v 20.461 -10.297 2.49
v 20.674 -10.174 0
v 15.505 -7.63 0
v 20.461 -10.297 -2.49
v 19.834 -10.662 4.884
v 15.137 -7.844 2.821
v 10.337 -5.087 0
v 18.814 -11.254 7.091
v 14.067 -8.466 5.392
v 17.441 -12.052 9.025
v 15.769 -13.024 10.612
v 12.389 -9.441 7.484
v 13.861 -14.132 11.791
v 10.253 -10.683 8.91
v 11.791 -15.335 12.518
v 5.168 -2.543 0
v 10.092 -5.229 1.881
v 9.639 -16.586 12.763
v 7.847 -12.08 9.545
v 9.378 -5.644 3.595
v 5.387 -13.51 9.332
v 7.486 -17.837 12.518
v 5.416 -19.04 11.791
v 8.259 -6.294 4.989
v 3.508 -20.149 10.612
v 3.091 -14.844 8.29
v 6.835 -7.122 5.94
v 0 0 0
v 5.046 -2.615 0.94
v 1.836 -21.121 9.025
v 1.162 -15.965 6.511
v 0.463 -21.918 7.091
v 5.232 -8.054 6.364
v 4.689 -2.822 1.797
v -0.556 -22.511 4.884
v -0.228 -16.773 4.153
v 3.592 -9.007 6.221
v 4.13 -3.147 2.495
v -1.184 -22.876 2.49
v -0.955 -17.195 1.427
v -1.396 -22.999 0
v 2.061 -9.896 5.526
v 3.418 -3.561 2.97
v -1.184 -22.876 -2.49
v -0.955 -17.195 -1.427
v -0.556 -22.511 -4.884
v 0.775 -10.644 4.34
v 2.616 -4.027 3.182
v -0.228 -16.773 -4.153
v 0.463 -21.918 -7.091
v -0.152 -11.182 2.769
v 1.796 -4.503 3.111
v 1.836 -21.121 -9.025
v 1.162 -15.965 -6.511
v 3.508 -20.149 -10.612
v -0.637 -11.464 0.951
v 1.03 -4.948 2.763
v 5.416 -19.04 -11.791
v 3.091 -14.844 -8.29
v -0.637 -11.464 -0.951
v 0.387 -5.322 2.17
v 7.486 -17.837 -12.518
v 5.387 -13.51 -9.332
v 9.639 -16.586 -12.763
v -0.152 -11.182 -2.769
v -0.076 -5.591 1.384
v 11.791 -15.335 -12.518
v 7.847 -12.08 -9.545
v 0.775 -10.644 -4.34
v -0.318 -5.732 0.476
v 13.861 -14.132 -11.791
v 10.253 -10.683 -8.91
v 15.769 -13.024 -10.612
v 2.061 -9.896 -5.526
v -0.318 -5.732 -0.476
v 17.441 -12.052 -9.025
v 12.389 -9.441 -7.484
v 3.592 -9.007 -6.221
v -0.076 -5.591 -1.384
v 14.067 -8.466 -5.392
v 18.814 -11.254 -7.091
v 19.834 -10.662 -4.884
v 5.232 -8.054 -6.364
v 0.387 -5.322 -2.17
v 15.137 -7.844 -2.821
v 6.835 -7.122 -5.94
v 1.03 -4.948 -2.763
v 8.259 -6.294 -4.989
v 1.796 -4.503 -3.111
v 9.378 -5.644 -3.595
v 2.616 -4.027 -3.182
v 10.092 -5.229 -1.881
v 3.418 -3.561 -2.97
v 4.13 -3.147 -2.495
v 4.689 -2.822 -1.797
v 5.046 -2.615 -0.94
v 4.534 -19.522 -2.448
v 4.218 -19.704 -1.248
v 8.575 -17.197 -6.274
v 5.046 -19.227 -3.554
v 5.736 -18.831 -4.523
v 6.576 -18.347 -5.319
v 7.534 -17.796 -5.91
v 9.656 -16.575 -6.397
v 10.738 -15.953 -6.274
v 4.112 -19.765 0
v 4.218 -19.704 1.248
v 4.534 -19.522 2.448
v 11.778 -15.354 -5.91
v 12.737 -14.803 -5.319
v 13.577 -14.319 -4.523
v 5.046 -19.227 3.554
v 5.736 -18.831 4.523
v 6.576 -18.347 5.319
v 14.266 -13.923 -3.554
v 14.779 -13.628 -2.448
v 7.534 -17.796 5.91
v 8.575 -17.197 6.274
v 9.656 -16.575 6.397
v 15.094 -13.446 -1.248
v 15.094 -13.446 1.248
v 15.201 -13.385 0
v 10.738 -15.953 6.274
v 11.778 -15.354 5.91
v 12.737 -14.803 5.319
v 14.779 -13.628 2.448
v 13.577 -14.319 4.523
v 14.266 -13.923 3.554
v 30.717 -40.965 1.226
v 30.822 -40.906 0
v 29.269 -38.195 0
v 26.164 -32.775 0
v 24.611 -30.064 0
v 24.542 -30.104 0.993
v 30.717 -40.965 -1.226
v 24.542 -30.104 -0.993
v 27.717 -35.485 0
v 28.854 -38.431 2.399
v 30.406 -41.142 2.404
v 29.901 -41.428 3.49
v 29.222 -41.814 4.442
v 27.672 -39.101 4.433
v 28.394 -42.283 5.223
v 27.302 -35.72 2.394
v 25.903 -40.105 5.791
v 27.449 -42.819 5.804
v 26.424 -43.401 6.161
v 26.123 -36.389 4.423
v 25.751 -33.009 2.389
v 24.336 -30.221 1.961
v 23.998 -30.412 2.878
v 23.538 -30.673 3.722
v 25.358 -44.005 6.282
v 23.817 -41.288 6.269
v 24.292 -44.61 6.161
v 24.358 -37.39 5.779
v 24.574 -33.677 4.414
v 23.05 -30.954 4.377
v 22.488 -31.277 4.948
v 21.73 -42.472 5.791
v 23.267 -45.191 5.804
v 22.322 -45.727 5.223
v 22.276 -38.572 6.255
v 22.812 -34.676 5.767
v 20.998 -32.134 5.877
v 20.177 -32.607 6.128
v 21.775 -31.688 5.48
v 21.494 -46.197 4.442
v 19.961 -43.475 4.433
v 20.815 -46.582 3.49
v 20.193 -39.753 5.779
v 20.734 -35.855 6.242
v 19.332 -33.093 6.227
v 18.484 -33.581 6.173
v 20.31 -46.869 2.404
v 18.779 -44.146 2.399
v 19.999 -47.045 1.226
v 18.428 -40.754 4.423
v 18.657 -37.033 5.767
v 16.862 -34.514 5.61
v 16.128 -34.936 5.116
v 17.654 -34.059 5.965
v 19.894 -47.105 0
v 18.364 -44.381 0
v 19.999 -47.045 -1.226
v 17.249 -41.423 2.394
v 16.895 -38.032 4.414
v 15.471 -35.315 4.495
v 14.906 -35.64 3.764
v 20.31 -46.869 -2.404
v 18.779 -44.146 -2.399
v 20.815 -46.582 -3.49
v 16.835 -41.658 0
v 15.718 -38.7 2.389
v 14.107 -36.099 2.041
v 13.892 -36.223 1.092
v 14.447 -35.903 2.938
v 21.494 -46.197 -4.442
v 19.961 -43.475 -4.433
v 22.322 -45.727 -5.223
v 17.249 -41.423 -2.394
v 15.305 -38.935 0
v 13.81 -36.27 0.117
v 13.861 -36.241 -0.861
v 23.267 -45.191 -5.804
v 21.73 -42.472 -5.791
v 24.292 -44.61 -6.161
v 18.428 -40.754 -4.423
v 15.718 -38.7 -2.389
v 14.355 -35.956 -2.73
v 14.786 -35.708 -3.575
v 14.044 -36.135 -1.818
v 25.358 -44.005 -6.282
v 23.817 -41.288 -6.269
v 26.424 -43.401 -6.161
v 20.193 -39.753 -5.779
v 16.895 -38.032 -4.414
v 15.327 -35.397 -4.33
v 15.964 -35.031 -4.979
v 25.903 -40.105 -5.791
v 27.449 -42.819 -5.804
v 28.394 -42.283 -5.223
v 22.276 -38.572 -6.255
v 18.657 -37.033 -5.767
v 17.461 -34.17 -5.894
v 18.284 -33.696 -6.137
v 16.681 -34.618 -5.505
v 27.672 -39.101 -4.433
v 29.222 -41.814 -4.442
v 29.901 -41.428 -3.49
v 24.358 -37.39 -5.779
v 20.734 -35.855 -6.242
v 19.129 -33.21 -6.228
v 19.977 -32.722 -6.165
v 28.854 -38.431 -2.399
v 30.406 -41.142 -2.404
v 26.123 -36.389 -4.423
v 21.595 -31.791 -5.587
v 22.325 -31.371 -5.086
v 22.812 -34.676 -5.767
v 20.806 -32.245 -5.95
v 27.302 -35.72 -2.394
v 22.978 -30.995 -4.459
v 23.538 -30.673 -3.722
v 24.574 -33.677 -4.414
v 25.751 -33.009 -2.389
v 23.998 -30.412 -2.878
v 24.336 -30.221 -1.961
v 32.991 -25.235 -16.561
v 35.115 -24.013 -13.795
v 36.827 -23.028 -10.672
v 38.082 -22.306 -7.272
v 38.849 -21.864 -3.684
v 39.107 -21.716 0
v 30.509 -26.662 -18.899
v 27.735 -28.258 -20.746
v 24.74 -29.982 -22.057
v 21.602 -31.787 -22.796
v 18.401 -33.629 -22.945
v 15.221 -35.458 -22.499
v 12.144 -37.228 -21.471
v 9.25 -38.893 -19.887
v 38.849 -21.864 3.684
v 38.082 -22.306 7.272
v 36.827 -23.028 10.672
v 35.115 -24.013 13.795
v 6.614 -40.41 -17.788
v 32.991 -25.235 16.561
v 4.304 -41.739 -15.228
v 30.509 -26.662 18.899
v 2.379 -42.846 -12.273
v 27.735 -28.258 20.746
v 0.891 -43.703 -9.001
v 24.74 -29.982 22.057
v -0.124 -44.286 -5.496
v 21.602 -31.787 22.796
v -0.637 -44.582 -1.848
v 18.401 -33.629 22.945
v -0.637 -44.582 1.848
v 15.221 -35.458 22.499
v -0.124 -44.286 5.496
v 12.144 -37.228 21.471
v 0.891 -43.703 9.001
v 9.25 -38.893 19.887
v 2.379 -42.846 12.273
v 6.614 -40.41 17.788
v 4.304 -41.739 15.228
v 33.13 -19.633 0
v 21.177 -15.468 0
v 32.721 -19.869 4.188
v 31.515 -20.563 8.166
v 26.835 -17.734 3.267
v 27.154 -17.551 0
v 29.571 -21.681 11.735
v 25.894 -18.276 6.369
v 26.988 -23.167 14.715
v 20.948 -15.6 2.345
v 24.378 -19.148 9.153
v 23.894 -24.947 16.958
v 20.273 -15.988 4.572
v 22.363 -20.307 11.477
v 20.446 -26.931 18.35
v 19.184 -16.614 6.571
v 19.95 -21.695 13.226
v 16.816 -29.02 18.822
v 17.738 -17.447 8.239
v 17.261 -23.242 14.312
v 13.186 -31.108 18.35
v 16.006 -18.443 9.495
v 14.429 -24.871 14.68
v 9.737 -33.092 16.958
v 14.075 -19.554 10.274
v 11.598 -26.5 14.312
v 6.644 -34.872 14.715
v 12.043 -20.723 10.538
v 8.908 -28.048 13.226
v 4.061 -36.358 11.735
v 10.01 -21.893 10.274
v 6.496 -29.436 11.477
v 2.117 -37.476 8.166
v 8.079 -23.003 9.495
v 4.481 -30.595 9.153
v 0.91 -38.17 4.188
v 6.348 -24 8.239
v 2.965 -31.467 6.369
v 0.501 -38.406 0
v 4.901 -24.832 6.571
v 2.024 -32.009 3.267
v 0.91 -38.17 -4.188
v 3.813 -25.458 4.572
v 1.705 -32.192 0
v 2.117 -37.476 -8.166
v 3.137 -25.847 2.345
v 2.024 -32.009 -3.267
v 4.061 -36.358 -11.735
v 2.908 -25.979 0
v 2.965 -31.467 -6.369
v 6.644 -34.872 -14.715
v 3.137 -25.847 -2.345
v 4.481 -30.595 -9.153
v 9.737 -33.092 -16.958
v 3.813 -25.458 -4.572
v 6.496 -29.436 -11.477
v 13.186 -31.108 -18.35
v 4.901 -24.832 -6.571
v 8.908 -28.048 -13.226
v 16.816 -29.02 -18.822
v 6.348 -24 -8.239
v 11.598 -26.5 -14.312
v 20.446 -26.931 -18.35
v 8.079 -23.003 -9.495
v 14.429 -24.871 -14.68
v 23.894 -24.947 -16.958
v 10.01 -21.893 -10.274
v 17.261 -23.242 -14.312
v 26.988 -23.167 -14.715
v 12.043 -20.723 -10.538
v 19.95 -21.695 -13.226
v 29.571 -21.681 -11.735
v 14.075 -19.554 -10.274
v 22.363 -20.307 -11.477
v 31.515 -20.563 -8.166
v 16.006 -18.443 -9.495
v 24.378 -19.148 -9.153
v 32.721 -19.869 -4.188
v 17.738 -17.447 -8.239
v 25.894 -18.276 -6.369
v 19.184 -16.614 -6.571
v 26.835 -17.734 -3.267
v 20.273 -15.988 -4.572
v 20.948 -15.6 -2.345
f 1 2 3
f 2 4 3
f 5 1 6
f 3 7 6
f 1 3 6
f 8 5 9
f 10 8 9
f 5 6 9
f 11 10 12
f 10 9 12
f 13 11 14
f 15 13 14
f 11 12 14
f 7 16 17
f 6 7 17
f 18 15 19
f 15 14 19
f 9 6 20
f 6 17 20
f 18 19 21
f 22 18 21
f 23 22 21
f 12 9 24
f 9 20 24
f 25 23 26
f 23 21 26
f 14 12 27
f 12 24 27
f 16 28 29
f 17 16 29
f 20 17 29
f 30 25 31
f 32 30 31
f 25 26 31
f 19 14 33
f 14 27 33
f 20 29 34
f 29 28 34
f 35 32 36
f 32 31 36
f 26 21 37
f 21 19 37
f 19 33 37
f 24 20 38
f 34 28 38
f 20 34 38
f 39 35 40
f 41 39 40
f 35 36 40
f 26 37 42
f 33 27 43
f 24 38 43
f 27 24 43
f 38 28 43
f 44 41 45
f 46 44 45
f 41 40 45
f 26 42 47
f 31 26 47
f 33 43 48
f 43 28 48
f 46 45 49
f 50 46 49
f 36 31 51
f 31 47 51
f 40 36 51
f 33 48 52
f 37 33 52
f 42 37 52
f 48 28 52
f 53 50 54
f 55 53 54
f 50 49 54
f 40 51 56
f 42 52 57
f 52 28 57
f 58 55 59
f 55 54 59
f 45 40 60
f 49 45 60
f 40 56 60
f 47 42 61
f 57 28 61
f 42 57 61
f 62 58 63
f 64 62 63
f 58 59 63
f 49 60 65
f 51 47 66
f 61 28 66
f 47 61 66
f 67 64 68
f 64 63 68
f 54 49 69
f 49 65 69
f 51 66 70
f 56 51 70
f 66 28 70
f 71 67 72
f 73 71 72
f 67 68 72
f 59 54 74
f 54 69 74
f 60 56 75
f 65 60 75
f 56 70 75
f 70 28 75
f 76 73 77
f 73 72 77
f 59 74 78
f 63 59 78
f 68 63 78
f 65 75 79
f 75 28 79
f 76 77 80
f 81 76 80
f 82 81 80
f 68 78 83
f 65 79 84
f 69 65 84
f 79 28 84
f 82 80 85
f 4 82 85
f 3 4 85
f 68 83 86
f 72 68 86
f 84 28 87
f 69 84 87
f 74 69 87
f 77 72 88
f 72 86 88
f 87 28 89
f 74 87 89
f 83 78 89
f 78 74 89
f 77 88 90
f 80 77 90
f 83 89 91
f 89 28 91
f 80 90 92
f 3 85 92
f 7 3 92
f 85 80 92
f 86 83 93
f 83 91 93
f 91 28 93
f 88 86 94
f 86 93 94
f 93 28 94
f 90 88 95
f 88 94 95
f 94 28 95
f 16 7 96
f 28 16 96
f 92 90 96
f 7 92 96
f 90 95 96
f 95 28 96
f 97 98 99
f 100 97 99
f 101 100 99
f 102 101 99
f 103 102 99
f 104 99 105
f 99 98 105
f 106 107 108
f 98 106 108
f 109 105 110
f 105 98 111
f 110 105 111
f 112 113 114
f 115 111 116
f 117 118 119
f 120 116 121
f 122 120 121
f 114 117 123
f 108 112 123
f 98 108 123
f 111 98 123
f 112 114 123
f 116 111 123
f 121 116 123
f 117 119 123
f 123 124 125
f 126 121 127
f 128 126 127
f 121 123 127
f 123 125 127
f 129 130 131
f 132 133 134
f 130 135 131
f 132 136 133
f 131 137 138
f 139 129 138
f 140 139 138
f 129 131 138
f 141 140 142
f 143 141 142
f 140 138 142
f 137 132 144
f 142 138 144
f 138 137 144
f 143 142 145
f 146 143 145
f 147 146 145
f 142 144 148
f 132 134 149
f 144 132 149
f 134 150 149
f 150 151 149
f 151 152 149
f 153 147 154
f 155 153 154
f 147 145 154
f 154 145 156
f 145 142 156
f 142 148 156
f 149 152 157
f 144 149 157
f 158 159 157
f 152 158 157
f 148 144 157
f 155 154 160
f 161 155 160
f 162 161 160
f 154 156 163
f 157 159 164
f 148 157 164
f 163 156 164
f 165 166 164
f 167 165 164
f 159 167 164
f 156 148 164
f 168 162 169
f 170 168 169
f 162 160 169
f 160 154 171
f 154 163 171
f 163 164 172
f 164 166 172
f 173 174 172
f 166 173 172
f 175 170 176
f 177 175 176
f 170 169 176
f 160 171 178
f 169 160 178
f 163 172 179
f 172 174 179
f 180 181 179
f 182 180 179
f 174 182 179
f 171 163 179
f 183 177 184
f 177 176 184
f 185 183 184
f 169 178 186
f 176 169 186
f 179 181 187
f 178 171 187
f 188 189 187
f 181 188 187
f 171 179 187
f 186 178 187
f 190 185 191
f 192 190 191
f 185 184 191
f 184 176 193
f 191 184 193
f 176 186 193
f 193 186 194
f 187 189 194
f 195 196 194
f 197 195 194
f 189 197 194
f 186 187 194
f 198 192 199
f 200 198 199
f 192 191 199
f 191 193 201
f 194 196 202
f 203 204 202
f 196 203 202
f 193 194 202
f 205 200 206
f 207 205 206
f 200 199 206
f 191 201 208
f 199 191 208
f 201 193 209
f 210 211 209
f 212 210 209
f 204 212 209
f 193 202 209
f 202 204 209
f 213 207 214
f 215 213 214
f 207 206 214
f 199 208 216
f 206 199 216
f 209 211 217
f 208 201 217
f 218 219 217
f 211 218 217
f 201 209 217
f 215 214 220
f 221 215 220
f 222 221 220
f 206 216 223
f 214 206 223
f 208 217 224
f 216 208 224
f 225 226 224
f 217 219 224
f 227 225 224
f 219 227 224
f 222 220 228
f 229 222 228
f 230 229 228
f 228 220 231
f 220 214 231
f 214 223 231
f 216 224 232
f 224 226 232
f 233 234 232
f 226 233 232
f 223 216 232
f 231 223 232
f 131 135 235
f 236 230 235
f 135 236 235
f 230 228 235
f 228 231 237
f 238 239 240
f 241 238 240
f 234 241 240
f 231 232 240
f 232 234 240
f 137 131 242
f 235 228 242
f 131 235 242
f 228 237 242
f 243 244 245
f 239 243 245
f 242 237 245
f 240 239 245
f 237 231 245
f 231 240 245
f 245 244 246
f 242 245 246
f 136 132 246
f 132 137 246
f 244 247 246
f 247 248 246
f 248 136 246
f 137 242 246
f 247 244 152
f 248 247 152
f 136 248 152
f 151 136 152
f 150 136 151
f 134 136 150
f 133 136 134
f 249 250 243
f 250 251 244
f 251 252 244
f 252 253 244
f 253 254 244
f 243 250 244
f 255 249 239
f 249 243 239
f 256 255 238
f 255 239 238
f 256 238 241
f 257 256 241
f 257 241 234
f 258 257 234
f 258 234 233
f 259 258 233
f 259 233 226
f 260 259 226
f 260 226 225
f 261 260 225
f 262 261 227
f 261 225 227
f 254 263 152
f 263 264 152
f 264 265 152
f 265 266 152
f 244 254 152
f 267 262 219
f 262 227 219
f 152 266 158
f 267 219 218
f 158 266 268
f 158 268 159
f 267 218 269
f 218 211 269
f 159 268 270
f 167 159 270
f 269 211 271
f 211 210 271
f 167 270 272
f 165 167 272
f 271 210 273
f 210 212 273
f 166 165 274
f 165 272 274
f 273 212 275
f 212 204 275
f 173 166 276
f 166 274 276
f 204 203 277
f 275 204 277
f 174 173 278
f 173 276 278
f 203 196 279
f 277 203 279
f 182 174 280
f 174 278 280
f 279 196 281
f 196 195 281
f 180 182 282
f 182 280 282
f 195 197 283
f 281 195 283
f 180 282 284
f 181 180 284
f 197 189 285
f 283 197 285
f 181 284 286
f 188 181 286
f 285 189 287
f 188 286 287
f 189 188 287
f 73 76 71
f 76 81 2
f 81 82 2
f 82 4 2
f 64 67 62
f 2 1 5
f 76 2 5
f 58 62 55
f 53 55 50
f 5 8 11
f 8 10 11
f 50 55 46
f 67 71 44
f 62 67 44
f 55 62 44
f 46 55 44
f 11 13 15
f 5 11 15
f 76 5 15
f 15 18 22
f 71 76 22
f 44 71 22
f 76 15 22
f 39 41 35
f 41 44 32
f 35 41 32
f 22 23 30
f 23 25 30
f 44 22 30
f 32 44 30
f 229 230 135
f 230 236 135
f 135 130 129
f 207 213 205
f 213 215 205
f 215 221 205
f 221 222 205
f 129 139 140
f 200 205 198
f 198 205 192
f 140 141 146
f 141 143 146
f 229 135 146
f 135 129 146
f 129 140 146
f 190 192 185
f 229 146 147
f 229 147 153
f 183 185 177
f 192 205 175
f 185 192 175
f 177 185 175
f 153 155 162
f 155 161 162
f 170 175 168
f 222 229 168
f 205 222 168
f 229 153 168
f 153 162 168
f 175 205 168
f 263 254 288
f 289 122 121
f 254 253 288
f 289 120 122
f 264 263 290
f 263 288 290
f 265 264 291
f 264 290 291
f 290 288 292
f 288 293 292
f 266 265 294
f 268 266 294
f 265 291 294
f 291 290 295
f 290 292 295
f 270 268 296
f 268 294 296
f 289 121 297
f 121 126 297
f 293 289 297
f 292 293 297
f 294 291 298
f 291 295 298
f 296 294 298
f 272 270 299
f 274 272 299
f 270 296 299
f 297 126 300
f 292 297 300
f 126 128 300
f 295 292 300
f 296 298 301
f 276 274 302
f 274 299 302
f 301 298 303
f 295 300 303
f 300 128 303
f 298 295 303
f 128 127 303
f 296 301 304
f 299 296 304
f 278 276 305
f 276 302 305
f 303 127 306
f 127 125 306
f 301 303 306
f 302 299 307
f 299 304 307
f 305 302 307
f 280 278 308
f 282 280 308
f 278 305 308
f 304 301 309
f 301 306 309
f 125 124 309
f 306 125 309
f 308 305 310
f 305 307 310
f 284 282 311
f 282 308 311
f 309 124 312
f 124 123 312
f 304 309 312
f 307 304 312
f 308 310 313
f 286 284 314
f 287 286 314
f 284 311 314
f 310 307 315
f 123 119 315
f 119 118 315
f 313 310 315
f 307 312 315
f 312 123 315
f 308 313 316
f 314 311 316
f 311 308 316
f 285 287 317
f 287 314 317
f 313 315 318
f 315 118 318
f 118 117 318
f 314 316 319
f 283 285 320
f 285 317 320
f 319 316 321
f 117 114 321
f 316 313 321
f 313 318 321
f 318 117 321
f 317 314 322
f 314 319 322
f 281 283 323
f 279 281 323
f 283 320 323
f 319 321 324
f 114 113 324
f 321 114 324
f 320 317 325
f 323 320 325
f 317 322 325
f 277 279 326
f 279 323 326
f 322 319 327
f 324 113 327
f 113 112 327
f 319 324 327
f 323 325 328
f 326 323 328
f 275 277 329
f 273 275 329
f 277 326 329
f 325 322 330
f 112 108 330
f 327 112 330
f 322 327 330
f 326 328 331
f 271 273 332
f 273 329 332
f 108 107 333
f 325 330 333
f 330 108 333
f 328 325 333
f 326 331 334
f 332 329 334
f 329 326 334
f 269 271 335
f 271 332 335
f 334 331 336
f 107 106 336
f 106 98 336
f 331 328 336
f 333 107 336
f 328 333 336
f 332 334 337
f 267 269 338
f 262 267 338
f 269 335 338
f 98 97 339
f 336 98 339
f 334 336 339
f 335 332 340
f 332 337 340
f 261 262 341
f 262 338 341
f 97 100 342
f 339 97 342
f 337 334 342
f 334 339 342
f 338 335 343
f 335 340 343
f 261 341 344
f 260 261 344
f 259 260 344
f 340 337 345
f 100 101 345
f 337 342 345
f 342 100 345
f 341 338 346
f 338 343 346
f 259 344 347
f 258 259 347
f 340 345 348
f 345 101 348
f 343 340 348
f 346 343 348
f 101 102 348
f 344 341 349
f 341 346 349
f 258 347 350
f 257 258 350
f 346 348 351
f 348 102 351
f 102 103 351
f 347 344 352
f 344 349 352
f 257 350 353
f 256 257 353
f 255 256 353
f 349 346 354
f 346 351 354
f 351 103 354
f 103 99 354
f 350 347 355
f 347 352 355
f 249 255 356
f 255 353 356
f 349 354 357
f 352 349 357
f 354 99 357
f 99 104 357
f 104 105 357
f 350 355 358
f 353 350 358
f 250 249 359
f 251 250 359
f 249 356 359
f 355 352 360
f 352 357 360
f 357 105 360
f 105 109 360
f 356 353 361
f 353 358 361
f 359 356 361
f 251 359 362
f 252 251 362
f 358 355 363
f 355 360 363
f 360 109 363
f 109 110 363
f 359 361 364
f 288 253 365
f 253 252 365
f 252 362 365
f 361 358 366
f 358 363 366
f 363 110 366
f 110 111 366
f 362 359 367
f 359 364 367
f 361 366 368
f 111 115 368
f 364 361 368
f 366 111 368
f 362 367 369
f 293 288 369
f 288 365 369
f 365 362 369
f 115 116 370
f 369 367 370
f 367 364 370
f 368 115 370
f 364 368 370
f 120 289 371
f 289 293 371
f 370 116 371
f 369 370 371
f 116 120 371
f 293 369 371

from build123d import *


with BuildPart() as f1:
    # F0 (on Top) → F1 (revolve)
    with BuildSketch(Plane.XY):
        Polygon((20.6735245273, -10.1737510542), (0, 0), (9.6385749057, -16.5863316506), align=None)
    revolve(axis=Axis((4.8192874528, -8.2931658253, 0), (0.5024396308, -0.8646122931, 0)))


with BuildPart() as f4:
    # F2 (on Top) → F4 (revolve)
    with BuildSketch(Plane.XY):
        Polygon((15.2008896694, -13.3851878345), (9.6562886611, -16.57512784), (19.2023482047, -33.1676315482), (39.1067235685, -21.7161739657), align=None)
    revolve(axis=Axis((14.4293184329, -24.8713796941, 0), (0.4986819291, -0.8667850562, 0)))

    # F3 (on Top) → F5 (revolve)
    with BuildSketch(Plane.XY):
        Polygon((24.6111322194, -30.0644841045), (19.1932790988, -33.137831626), (25.3579408743, -44.0052105362), (30.8218967437, -40.905710632), align=None)
    revolve(axis=Axis((22.2756099865, -38.5715210811, 0), (0.4934051273, -0.8697996208, 0)))


solid = Compound([f1.part, f4.part])
